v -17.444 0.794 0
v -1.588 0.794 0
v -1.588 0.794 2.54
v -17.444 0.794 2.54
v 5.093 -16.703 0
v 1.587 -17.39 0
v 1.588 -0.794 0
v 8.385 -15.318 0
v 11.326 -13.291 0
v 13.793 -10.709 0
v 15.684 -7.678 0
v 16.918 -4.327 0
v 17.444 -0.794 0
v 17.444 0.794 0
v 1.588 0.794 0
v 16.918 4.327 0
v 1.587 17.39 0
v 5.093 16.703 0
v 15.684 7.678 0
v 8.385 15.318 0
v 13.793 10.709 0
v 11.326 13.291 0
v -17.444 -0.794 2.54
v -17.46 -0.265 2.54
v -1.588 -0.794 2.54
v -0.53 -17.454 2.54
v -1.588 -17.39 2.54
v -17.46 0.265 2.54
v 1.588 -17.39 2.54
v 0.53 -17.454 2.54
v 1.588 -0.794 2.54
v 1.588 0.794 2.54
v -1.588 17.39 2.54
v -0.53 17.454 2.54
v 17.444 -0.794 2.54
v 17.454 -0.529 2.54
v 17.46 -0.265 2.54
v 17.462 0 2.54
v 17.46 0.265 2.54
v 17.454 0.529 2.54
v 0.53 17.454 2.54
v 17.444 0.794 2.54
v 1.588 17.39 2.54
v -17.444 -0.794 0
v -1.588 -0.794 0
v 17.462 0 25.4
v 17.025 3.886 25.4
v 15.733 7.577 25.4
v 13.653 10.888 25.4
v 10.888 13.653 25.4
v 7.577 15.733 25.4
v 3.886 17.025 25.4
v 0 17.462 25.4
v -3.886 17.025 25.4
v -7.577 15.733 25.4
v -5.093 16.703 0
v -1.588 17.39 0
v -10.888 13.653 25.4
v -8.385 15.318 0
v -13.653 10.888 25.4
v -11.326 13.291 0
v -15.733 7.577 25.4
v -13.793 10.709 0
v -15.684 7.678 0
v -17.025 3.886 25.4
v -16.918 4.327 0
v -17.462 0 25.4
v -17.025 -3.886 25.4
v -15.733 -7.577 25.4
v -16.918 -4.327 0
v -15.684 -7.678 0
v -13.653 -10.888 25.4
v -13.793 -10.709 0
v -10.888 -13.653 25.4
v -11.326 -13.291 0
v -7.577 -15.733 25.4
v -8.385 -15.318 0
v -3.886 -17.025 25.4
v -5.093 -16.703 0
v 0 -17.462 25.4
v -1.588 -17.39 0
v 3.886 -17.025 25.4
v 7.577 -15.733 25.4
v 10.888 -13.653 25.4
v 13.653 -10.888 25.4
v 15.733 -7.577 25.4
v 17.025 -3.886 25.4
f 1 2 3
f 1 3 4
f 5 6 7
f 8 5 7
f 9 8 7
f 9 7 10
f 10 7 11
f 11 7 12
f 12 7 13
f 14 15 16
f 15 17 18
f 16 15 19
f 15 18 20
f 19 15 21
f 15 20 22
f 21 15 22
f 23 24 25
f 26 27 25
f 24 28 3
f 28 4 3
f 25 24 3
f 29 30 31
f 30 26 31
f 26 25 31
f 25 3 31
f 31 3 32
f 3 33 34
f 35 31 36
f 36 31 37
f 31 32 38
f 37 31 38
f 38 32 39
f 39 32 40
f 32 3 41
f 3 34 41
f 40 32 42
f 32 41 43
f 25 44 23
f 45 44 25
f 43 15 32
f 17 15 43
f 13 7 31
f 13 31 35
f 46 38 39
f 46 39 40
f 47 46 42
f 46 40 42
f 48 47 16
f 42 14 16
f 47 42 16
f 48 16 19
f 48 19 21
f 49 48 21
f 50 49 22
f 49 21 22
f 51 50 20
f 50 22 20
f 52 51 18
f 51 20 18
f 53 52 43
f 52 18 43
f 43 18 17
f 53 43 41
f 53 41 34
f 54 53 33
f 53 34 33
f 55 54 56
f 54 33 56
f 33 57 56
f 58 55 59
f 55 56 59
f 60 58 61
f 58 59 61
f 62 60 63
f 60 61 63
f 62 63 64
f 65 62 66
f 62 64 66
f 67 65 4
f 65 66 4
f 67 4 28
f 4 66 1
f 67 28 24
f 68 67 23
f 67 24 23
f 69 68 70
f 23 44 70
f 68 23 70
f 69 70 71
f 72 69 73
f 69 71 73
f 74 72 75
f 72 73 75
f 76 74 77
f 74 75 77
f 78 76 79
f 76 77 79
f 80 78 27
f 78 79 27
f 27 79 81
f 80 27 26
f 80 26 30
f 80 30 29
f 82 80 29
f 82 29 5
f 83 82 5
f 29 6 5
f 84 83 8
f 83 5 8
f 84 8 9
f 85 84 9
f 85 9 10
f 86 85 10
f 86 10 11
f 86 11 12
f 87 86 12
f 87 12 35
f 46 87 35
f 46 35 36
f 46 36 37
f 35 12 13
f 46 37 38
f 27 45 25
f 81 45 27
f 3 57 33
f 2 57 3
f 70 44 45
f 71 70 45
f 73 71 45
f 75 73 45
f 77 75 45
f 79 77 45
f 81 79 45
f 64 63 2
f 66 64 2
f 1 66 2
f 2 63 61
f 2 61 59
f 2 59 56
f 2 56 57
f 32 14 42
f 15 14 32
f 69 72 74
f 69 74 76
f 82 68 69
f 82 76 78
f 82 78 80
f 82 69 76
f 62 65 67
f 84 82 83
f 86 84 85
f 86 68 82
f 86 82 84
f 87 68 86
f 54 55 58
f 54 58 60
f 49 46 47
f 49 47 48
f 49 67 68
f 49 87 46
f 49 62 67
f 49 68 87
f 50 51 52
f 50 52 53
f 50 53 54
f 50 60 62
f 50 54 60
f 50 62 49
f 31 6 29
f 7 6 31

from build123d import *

# Parameters (mm, degrees)
SKETCH1_R           = 17.4625
BOSS_EXTRUDE1_DEPTH = 25.4
CUT_EXTRUDE1_DEPTH  = 2.54


with BuildPart() as part:
    # Sketch1 → Boss-Extrude1 (new body)
    with BuildSketch(Plane.XY):
        Circle(SKETCH1_R)
    extrude(amount=BOSS_EXTRUDE1_DEPTH)

    # Sketch2 → Cut-Extrude1 (cut)
    with BuildSketch(Plane(origin=(0, 0, 0), x_dir=(-1, 0, 0), z_dir=(0, 0, -1))):
        Polygon((1.5875, 0.79375), (23.225772956, 0.79375), (23.225772956, -0.79375), (1.5875, -0.79375), (1.5875, -19.542370193), (-1.5875, -19.542370193), (-1.5875, -0.79375), (-24.356135007, -0.79375), (-24.356135007, 0.79375), (-1.5875, 0.79375), (-1.5875, 20.58214549), (1.5875, 20.58214549), align=None)
    extrude(amount=-CUT_EXTRUDE1_DEPTH, mode=Mode.SUBTRACT)


solid = part.part
